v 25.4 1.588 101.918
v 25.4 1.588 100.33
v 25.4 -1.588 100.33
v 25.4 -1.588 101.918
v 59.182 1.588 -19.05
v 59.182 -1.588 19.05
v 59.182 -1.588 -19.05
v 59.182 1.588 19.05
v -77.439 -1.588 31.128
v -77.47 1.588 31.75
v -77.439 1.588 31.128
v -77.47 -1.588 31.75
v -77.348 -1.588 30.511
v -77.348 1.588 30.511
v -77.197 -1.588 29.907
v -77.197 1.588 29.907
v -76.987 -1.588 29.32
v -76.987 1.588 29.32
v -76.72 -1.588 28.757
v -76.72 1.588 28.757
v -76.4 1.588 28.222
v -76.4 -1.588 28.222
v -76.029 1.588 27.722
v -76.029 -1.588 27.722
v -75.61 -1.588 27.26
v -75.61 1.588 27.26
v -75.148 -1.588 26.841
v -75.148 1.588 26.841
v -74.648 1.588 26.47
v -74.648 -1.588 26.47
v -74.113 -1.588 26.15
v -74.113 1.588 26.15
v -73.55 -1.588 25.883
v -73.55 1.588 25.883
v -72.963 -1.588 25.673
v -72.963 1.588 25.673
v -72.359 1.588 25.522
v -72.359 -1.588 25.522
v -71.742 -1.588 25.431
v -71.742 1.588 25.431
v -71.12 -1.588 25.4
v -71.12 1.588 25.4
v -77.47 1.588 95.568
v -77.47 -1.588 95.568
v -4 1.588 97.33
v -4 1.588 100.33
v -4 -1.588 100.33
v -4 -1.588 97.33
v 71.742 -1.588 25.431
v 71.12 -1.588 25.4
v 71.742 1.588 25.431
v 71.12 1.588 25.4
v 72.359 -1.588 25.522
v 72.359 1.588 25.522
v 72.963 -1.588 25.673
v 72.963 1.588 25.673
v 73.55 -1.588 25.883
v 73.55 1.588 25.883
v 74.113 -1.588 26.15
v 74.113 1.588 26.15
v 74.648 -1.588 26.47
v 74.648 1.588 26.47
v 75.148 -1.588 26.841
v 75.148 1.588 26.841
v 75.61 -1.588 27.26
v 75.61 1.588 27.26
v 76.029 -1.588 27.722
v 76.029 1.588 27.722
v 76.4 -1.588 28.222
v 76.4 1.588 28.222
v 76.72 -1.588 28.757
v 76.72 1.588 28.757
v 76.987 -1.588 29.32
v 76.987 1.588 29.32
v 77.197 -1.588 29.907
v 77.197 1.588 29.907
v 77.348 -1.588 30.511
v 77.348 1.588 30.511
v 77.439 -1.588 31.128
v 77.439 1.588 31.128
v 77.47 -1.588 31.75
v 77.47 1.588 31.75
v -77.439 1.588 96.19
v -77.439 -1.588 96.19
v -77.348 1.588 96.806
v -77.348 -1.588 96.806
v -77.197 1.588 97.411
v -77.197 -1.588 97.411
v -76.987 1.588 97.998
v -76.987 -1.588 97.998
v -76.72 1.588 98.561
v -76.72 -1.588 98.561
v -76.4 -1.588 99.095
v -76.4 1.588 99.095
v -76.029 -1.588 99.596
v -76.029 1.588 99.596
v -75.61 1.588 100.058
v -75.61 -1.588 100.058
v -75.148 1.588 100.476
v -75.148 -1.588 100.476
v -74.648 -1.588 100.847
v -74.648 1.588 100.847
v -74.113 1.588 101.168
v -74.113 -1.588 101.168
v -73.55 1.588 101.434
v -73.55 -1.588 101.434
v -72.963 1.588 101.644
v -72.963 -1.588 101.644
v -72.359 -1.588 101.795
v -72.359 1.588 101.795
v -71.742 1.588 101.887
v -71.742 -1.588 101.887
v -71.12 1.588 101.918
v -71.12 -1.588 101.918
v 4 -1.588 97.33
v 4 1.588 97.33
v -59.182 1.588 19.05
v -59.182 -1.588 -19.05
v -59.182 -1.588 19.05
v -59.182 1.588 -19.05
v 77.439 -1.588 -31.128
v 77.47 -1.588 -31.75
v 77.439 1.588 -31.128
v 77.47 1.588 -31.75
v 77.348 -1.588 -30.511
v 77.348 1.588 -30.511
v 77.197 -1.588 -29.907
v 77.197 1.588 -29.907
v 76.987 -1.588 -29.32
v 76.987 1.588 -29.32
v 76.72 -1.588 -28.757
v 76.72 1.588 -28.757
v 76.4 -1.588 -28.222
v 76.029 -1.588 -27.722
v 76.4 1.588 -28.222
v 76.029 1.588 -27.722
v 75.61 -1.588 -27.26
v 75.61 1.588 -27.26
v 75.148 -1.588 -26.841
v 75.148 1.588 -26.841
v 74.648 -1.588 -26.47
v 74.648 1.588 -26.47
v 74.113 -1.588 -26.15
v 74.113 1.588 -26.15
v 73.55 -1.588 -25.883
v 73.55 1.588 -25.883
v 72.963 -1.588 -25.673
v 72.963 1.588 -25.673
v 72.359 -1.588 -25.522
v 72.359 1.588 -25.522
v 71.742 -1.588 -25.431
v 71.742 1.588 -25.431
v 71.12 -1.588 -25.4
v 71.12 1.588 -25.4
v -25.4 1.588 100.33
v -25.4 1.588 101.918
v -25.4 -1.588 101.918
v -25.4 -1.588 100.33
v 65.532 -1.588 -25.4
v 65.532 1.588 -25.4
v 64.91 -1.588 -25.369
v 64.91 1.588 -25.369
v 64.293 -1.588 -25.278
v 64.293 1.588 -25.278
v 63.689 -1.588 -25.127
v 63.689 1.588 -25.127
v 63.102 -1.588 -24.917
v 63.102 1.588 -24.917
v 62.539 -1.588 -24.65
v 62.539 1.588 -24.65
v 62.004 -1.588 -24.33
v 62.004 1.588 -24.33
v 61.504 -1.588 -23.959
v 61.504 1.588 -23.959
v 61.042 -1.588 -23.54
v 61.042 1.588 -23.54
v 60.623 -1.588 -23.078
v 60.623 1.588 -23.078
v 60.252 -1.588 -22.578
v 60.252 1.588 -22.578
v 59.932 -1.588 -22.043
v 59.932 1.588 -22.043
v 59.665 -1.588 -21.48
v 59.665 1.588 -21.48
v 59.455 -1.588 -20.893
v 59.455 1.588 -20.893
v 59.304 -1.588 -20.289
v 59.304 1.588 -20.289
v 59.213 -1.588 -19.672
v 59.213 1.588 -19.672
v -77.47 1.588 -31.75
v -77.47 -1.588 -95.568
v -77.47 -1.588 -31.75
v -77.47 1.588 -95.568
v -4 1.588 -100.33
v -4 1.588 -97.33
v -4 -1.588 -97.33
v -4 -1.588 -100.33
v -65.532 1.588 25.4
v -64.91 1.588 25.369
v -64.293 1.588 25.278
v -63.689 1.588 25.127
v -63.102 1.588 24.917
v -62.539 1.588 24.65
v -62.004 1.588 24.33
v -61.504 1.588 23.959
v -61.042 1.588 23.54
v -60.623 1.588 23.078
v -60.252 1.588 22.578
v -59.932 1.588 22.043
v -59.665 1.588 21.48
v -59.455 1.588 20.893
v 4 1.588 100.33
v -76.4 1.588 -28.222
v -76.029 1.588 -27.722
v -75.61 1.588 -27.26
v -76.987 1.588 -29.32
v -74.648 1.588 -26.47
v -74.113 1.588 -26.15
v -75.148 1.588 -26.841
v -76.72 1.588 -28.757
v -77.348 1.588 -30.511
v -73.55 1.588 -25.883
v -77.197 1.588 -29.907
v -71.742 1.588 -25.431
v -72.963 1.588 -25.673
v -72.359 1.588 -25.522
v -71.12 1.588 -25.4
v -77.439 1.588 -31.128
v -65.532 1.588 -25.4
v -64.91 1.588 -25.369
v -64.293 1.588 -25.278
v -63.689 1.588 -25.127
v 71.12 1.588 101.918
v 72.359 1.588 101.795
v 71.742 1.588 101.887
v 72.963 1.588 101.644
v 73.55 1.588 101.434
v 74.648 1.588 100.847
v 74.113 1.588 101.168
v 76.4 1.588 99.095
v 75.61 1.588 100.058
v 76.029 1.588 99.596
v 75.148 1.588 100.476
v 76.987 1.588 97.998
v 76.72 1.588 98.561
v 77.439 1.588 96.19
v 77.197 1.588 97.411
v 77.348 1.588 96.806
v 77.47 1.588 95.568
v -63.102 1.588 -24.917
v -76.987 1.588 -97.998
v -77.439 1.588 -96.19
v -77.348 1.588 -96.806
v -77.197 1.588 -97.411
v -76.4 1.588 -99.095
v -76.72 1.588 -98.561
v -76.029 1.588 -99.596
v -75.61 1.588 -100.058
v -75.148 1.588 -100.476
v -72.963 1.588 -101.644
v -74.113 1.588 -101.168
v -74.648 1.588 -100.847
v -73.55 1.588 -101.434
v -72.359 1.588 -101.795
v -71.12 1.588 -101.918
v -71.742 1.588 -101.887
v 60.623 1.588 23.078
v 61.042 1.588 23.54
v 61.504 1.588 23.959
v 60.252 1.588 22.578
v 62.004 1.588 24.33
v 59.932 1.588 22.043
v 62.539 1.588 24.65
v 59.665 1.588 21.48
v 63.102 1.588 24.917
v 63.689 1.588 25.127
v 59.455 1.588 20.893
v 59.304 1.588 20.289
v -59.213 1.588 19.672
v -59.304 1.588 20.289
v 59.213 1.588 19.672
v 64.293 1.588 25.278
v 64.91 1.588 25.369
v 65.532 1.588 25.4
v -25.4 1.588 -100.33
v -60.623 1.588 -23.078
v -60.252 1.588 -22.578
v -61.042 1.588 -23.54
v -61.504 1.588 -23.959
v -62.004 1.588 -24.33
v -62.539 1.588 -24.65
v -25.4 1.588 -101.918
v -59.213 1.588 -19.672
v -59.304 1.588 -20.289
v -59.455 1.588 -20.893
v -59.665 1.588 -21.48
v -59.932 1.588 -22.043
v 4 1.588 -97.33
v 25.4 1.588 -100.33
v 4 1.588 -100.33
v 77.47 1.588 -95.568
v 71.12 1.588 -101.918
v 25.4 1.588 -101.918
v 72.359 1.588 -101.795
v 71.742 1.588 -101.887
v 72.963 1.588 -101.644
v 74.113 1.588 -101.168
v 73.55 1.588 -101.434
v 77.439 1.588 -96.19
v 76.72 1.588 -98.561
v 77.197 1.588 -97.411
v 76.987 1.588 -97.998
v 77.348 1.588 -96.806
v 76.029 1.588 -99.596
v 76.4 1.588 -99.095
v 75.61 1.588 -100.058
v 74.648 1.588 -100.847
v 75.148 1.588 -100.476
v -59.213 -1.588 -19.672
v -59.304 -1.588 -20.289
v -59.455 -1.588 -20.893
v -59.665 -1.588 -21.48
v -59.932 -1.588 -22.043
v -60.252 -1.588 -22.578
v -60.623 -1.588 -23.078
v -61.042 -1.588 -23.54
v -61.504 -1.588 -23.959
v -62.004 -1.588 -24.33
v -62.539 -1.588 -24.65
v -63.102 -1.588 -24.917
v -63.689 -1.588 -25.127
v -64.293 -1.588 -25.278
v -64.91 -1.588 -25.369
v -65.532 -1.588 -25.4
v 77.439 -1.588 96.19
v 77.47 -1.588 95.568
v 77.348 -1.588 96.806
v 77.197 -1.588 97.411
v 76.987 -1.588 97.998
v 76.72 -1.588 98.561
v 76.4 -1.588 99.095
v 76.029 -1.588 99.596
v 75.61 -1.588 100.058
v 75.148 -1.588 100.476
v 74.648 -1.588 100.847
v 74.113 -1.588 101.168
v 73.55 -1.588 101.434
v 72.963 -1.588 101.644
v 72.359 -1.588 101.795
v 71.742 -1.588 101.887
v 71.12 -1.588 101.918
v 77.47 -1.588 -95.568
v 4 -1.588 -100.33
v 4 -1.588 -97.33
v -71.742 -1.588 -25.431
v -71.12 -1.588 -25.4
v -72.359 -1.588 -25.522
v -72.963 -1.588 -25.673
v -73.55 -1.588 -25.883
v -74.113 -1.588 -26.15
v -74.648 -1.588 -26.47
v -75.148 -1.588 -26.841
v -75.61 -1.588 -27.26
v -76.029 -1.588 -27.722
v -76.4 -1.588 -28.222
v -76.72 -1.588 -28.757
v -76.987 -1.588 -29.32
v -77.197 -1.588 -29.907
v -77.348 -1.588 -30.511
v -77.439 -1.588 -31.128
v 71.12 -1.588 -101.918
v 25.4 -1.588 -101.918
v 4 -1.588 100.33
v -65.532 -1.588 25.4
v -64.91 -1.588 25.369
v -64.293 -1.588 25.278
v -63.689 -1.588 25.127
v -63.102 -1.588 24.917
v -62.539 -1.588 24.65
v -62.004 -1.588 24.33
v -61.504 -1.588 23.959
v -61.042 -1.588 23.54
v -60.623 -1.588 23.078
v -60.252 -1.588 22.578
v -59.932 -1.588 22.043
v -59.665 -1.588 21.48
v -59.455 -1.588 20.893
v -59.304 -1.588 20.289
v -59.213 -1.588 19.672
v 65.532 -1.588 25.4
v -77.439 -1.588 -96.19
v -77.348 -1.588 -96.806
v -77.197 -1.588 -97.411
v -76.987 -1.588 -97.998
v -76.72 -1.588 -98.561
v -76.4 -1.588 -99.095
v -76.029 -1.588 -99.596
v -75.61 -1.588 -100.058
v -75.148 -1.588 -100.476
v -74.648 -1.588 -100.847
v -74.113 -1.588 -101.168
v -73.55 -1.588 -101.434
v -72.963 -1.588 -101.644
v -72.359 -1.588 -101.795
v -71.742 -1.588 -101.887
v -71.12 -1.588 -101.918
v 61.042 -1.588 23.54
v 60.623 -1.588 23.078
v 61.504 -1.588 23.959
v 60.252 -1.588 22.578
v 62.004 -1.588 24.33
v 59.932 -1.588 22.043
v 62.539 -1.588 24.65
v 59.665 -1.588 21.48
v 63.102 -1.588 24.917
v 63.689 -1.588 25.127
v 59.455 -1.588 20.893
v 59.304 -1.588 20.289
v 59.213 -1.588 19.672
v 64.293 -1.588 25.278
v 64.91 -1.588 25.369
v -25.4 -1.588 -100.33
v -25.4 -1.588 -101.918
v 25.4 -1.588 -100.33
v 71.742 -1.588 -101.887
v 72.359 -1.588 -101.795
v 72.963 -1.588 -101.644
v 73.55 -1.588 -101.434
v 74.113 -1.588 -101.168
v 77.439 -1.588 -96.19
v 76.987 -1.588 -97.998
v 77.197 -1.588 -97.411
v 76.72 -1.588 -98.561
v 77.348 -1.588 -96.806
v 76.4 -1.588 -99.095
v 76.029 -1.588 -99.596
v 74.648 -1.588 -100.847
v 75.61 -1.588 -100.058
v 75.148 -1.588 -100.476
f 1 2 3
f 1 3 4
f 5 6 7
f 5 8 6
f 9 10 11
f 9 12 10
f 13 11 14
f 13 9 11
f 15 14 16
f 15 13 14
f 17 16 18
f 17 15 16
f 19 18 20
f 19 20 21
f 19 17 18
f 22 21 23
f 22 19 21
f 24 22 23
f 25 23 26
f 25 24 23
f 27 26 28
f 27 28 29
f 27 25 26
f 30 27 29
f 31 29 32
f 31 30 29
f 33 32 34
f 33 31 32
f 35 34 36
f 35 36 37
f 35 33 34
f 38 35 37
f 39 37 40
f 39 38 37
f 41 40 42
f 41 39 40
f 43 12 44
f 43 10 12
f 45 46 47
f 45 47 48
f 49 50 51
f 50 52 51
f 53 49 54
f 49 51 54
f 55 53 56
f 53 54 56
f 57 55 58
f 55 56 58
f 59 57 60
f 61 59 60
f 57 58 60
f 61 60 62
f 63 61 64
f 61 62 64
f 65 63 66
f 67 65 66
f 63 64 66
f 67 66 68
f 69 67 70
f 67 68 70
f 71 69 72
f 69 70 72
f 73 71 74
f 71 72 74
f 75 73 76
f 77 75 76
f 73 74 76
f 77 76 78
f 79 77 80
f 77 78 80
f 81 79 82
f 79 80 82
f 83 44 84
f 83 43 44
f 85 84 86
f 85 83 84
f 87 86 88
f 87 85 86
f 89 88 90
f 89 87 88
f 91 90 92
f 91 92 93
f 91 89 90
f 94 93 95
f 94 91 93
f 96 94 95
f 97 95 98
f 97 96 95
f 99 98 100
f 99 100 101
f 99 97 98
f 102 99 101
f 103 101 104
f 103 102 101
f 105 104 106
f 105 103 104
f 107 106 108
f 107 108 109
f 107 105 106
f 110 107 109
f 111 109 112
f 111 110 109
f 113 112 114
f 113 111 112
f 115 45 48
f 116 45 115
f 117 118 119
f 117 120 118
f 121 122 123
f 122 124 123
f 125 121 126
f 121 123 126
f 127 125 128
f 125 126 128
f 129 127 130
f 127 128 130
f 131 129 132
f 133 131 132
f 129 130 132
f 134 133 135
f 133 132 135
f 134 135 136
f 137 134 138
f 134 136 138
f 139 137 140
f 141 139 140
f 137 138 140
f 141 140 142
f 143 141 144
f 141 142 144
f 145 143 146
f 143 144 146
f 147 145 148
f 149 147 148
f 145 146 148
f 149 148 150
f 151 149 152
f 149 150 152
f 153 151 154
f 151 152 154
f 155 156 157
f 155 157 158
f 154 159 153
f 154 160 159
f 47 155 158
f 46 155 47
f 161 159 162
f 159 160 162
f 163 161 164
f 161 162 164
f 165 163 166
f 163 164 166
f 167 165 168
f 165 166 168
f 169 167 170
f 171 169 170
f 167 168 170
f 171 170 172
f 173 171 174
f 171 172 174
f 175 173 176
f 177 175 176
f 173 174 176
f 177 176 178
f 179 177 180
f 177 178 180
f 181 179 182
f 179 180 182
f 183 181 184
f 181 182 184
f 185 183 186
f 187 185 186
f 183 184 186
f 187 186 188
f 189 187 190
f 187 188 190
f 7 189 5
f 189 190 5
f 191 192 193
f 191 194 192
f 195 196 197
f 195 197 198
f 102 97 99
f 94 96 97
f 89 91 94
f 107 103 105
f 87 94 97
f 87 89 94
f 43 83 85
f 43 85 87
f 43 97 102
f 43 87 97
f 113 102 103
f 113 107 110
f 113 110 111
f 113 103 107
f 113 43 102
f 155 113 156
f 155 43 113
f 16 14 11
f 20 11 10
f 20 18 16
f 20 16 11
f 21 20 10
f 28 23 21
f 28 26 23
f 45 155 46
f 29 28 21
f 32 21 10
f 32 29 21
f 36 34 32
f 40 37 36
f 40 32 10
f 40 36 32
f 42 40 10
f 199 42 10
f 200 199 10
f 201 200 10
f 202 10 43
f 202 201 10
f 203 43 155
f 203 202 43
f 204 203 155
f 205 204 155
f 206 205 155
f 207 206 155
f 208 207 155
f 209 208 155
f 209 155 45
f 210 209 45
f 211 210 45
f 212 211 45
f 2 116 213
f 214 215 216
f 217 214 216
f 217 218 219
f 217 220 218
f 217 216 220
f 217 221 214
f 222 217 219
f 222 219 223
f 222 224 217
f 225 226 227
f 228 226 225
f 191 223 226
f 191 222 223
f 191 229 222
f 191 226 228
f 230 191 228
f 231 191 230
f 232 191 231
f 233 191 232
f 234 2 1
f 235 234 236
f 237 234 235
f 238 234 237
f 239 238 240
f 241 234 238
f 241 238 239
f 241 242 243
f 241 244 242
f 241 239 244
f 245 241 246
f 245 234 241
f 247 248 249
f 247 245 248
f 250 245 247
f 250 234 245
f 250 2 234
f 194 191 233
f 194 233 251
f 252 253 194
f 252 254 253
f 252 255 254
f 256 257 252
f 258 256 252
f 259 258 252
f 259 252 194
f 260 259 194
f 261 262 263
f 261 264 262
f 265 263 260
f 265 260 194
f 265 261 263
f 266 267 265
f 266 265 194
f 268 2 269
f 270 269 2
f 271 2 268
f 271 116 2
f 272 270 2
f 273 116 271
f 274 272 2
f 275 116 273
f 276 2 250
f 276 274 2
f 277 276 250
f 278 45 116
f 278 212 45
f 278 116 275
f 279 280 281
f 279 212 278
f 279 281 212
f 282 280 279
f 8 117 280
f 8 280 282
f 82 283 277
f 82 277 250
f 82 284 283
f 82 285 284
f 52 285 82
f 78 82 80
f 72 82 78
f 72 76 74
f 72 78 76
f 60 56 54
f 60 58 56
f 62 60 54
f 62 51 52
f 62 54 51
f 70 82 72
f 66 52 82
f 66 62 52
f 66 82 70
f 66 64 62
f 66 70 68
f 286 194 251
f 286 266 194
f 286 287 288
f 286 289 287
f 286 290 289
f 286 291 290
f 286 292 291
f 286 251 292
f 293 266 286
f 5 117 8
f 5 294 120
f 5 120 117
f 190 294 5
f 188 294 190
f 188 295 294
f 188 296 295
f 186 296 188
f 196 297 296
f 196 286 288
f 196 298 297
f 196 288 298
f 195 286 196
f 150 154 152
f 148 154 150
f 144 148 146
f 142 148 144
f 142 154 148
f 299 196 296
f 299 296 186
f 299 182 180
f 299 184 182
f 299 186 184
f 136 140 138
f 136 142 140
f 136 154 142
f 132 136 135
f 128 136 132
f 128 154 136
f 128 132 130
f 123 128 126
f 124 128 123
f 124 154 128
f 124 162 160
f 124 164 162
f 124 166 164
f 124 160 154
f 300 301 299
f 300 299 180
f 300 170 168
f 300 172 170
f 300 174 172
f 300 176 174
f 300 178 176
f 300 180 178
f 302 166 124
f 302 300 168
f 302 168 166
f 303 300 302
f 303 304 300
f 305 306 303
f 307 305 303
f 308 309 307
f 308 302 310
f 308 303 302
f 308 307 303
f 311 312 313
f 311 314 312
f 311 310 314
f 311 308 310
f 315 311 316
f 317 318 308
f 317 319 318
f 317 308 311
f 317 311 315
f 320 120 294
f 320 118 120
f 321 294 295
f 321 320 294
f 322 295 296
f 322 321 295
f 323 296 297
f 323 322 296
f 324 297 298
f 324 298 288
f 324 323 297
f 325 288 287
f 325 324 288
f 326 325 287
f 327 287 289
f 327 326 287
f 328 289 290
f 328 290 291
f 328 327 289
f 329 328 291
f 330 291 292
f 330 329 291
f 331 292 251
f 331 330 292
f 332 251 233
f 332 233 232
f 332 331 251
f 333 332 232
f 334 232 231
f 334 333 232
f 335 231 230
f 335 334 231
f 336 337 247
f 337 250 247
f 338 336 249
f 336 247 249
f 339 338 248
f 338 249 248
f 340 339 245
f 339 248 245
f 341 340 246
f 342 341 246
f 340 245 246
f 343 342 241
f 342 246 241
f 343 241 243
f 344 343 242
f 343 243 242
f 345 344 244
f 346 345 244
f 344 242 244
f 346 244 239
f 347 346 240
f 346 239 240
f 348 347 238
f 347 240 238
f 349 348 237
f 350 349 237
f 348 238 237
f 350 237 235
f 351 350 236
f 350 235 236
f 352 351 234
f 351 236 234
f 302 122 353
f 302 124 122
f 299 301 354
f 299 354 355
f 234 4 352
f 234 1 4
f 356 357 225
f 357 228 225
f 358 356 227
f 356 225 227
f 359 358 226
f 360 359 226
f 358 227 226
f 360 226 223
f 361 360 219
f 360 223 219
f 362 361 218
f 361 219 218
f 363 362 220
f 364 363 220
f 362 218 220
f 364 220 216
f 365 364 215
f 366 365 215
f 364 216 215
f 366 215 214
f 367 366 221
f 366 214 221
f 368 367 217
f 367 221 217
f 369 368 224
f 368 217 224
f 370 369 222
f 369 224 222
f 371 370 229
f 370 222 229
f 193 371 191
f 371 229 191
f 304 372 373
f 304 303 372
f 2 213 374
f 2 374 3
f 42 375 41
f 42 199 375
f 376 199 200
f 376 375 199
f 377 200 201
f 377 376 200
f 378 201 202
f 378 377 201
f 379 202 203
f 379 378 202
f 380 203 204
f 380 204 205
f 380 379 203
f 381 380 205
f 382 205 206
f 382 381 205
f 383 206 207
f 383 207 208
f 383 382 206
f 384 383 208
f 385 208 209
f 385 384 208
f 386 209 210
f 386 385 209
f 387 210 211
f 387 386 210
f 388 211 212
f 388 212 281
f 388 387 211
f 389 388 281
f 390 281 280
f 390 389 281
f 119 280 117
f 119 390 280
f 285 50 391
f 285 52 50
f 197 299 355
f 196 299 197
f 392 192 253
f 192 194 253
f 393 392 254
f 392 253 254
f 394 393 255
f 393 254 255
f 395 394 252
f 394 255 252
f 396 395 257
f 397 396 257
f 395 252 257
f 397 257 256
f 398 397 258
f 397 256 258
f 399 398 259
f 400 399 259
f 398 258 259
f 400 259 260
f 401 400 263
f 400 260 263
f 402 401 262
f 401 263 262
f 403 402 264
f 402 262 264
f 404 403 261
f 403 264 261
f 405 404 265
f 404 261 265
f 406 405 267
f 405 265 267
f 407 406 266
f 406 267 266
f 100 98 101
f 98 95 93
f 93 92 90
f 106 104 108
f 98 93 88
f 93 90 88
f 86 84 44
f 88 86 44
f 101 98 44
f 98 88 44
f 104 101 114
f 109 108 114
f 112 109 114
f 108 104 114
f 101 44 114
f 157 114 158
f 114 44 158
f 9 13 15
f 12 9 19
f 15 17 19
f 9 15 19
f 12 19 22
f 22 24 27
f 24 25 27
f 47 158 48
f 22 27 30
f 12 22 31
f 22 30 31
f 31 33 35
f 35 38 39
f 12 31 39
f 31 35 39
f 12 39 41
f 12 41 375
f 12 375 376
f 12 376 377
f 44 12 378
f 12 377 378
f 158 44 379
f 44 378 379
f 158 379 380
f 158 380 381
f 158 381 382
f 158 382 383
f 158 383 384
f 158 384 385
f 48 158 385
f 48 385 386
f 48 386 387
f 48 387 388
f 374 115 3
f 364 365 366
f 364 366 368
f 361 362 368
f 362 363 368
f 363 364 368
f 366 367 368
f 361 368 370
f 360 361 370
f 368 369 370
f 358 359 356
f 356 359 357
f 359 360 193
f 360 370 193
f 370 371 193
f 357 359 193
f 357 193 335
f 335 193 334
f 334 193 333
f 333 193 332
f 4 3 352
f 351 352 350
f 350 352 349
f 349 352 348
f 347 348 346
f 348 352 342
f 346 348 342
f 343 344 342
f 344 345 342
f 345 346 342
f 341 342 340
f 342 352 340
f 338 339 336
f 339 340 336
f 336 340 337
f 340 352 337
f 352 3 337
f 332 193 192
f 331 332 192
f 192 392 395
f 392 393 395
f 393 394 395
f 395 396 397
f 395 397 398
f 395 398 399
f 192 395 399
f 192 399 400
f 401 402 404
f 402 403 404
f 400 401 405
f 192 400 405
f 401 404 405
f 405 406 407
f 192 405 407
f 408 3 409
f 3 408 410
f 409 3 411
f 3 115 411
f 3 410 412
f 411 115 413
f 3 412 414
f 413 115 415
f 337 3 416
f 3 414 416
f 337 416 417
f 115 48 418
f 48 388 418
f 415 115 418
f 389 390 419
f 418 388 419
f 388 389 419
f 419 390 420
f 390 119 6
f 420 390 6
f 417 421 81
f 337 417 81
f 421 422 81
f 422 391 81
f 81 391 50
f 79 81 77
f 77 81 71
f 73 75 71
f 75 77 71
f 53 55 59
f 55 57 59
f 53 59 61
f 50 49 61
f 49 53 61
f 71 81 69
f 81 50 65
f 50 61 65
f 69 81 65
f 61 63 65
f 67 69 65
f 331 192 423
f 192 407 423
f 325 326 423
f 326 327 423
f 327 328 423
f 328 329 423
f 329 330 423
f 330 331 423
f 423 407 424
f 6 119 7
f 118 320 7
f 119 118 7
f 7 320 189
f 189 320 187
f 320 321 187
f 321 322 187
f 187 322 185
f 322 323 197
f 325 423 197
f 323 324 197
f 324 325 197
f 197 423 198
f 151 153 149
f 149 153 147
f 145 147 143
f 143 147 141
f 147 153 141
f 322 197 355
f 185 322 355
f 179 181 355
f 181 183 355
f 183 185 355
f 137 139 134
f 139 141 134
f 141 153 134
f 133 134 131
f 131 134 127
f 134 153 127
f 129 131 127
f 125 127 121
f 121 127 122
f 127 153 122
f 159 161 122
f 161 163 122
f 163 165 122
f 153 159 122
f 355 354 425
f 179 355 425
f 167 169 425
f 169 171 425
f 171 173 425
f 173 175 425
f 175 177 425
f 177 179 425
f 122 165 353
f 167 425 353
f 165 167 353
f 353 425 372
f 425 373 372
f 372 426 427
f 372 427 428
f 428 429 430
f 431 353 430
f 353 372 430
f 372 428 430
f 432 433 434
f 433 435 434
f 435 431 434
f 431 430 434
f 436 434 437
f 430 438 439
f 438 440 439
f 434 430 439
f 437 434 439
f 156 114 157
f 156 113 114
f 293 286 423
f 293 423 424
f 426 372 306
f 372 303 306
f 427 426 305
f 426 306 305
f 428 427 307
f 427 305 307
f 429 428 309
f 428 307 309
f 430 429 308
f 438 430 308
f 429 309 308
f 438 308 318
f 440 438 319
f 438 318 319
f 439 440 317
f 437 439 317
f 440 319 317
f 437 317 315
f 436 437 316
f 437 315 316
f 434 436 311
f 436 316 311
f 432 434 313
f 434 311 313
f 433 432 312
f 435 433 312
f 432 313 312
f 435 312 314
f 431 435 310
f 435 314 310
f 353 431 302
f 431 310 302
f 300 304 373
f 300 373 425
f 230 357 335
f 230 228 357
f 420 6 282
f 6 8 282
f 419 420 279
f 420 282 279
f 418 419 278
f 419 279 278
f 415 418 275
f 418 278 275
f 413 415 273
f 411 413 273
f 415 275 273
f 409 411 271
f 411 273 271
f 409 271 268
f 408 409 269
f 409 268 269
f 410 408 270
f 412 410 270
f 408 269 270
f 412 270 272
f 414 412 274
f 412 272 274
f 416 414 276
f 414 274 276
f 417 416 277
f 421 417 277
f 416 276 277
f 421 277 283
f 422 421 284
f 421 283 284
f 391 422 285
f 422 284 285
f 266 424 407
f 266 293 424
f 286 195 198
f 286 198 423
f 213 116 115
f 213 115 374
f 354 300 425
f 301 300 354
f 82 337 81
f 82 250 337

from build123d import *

# Parameters (mm, degrees)
BOSS_EXTRUDE3_DEPTH = 1.5875
FILLET1_R           = 6.35


with BuildPart() as part:
    # Sketch3 → Boss-Extrude3 (new body, symmetric)
    with BuildSketch(Plane(origin=(0, 0, 0), x_dir=(1, 0, 0), z_dir=(0, 1, 0))):
        Polygon((-77.47, -25.4), (-77.47, -101.9175), (-25.4, -101.9175), (-25.4, -100.33), (-4, -100.33), (-4, -97.33), (4, -97.33), (4, -100.33), (25.4, -100.33), (25.4, -101.9175), (77.47, -101.9175), (77.47, -25.4), (59.182, -25.4), (59.182, 25.4), (77.47, 25.4), (77.47, 101.9175), (25.4, 101.9175), (25.4, 100.33), (4, 100.33), (4, 97.33), (-4, 97.33), (-4, 100.33), (-25.4, 100.33), (-25.4, 101.9175), (-77.47, 101.9175), (-77.47, 25.4), (-59.182, 25.4), (-59.182, -25.4), align=None)
    extrude(amount=BOSS_EXTRUDE3_DEPTH, both=True)

    # Fillet1
    fillet1_edges = [part.edges().sort_by_distance(p)[0] for p in [
        (-77.47, 0, -101.9175),
        (77.47, 0, -101.9175),
        (77.47, 0, -25.4),
        (59.182, 0, -25.4),
        (59.182, 0, 25.4),
        (77.47, 0, 25.4),
        (77.47, 0, 101.9175),
        (-77.47, 0, 101.9175),
        (-77.47, 0, 25.4),
        (-59.182, 0, 25.4),
        (-59.182, 0, -25.4),
        (-77.47, 0, -25.4),
    ]]
    fillet(fillet1_edges, radius=FILLET1_R)


solid = part.part
